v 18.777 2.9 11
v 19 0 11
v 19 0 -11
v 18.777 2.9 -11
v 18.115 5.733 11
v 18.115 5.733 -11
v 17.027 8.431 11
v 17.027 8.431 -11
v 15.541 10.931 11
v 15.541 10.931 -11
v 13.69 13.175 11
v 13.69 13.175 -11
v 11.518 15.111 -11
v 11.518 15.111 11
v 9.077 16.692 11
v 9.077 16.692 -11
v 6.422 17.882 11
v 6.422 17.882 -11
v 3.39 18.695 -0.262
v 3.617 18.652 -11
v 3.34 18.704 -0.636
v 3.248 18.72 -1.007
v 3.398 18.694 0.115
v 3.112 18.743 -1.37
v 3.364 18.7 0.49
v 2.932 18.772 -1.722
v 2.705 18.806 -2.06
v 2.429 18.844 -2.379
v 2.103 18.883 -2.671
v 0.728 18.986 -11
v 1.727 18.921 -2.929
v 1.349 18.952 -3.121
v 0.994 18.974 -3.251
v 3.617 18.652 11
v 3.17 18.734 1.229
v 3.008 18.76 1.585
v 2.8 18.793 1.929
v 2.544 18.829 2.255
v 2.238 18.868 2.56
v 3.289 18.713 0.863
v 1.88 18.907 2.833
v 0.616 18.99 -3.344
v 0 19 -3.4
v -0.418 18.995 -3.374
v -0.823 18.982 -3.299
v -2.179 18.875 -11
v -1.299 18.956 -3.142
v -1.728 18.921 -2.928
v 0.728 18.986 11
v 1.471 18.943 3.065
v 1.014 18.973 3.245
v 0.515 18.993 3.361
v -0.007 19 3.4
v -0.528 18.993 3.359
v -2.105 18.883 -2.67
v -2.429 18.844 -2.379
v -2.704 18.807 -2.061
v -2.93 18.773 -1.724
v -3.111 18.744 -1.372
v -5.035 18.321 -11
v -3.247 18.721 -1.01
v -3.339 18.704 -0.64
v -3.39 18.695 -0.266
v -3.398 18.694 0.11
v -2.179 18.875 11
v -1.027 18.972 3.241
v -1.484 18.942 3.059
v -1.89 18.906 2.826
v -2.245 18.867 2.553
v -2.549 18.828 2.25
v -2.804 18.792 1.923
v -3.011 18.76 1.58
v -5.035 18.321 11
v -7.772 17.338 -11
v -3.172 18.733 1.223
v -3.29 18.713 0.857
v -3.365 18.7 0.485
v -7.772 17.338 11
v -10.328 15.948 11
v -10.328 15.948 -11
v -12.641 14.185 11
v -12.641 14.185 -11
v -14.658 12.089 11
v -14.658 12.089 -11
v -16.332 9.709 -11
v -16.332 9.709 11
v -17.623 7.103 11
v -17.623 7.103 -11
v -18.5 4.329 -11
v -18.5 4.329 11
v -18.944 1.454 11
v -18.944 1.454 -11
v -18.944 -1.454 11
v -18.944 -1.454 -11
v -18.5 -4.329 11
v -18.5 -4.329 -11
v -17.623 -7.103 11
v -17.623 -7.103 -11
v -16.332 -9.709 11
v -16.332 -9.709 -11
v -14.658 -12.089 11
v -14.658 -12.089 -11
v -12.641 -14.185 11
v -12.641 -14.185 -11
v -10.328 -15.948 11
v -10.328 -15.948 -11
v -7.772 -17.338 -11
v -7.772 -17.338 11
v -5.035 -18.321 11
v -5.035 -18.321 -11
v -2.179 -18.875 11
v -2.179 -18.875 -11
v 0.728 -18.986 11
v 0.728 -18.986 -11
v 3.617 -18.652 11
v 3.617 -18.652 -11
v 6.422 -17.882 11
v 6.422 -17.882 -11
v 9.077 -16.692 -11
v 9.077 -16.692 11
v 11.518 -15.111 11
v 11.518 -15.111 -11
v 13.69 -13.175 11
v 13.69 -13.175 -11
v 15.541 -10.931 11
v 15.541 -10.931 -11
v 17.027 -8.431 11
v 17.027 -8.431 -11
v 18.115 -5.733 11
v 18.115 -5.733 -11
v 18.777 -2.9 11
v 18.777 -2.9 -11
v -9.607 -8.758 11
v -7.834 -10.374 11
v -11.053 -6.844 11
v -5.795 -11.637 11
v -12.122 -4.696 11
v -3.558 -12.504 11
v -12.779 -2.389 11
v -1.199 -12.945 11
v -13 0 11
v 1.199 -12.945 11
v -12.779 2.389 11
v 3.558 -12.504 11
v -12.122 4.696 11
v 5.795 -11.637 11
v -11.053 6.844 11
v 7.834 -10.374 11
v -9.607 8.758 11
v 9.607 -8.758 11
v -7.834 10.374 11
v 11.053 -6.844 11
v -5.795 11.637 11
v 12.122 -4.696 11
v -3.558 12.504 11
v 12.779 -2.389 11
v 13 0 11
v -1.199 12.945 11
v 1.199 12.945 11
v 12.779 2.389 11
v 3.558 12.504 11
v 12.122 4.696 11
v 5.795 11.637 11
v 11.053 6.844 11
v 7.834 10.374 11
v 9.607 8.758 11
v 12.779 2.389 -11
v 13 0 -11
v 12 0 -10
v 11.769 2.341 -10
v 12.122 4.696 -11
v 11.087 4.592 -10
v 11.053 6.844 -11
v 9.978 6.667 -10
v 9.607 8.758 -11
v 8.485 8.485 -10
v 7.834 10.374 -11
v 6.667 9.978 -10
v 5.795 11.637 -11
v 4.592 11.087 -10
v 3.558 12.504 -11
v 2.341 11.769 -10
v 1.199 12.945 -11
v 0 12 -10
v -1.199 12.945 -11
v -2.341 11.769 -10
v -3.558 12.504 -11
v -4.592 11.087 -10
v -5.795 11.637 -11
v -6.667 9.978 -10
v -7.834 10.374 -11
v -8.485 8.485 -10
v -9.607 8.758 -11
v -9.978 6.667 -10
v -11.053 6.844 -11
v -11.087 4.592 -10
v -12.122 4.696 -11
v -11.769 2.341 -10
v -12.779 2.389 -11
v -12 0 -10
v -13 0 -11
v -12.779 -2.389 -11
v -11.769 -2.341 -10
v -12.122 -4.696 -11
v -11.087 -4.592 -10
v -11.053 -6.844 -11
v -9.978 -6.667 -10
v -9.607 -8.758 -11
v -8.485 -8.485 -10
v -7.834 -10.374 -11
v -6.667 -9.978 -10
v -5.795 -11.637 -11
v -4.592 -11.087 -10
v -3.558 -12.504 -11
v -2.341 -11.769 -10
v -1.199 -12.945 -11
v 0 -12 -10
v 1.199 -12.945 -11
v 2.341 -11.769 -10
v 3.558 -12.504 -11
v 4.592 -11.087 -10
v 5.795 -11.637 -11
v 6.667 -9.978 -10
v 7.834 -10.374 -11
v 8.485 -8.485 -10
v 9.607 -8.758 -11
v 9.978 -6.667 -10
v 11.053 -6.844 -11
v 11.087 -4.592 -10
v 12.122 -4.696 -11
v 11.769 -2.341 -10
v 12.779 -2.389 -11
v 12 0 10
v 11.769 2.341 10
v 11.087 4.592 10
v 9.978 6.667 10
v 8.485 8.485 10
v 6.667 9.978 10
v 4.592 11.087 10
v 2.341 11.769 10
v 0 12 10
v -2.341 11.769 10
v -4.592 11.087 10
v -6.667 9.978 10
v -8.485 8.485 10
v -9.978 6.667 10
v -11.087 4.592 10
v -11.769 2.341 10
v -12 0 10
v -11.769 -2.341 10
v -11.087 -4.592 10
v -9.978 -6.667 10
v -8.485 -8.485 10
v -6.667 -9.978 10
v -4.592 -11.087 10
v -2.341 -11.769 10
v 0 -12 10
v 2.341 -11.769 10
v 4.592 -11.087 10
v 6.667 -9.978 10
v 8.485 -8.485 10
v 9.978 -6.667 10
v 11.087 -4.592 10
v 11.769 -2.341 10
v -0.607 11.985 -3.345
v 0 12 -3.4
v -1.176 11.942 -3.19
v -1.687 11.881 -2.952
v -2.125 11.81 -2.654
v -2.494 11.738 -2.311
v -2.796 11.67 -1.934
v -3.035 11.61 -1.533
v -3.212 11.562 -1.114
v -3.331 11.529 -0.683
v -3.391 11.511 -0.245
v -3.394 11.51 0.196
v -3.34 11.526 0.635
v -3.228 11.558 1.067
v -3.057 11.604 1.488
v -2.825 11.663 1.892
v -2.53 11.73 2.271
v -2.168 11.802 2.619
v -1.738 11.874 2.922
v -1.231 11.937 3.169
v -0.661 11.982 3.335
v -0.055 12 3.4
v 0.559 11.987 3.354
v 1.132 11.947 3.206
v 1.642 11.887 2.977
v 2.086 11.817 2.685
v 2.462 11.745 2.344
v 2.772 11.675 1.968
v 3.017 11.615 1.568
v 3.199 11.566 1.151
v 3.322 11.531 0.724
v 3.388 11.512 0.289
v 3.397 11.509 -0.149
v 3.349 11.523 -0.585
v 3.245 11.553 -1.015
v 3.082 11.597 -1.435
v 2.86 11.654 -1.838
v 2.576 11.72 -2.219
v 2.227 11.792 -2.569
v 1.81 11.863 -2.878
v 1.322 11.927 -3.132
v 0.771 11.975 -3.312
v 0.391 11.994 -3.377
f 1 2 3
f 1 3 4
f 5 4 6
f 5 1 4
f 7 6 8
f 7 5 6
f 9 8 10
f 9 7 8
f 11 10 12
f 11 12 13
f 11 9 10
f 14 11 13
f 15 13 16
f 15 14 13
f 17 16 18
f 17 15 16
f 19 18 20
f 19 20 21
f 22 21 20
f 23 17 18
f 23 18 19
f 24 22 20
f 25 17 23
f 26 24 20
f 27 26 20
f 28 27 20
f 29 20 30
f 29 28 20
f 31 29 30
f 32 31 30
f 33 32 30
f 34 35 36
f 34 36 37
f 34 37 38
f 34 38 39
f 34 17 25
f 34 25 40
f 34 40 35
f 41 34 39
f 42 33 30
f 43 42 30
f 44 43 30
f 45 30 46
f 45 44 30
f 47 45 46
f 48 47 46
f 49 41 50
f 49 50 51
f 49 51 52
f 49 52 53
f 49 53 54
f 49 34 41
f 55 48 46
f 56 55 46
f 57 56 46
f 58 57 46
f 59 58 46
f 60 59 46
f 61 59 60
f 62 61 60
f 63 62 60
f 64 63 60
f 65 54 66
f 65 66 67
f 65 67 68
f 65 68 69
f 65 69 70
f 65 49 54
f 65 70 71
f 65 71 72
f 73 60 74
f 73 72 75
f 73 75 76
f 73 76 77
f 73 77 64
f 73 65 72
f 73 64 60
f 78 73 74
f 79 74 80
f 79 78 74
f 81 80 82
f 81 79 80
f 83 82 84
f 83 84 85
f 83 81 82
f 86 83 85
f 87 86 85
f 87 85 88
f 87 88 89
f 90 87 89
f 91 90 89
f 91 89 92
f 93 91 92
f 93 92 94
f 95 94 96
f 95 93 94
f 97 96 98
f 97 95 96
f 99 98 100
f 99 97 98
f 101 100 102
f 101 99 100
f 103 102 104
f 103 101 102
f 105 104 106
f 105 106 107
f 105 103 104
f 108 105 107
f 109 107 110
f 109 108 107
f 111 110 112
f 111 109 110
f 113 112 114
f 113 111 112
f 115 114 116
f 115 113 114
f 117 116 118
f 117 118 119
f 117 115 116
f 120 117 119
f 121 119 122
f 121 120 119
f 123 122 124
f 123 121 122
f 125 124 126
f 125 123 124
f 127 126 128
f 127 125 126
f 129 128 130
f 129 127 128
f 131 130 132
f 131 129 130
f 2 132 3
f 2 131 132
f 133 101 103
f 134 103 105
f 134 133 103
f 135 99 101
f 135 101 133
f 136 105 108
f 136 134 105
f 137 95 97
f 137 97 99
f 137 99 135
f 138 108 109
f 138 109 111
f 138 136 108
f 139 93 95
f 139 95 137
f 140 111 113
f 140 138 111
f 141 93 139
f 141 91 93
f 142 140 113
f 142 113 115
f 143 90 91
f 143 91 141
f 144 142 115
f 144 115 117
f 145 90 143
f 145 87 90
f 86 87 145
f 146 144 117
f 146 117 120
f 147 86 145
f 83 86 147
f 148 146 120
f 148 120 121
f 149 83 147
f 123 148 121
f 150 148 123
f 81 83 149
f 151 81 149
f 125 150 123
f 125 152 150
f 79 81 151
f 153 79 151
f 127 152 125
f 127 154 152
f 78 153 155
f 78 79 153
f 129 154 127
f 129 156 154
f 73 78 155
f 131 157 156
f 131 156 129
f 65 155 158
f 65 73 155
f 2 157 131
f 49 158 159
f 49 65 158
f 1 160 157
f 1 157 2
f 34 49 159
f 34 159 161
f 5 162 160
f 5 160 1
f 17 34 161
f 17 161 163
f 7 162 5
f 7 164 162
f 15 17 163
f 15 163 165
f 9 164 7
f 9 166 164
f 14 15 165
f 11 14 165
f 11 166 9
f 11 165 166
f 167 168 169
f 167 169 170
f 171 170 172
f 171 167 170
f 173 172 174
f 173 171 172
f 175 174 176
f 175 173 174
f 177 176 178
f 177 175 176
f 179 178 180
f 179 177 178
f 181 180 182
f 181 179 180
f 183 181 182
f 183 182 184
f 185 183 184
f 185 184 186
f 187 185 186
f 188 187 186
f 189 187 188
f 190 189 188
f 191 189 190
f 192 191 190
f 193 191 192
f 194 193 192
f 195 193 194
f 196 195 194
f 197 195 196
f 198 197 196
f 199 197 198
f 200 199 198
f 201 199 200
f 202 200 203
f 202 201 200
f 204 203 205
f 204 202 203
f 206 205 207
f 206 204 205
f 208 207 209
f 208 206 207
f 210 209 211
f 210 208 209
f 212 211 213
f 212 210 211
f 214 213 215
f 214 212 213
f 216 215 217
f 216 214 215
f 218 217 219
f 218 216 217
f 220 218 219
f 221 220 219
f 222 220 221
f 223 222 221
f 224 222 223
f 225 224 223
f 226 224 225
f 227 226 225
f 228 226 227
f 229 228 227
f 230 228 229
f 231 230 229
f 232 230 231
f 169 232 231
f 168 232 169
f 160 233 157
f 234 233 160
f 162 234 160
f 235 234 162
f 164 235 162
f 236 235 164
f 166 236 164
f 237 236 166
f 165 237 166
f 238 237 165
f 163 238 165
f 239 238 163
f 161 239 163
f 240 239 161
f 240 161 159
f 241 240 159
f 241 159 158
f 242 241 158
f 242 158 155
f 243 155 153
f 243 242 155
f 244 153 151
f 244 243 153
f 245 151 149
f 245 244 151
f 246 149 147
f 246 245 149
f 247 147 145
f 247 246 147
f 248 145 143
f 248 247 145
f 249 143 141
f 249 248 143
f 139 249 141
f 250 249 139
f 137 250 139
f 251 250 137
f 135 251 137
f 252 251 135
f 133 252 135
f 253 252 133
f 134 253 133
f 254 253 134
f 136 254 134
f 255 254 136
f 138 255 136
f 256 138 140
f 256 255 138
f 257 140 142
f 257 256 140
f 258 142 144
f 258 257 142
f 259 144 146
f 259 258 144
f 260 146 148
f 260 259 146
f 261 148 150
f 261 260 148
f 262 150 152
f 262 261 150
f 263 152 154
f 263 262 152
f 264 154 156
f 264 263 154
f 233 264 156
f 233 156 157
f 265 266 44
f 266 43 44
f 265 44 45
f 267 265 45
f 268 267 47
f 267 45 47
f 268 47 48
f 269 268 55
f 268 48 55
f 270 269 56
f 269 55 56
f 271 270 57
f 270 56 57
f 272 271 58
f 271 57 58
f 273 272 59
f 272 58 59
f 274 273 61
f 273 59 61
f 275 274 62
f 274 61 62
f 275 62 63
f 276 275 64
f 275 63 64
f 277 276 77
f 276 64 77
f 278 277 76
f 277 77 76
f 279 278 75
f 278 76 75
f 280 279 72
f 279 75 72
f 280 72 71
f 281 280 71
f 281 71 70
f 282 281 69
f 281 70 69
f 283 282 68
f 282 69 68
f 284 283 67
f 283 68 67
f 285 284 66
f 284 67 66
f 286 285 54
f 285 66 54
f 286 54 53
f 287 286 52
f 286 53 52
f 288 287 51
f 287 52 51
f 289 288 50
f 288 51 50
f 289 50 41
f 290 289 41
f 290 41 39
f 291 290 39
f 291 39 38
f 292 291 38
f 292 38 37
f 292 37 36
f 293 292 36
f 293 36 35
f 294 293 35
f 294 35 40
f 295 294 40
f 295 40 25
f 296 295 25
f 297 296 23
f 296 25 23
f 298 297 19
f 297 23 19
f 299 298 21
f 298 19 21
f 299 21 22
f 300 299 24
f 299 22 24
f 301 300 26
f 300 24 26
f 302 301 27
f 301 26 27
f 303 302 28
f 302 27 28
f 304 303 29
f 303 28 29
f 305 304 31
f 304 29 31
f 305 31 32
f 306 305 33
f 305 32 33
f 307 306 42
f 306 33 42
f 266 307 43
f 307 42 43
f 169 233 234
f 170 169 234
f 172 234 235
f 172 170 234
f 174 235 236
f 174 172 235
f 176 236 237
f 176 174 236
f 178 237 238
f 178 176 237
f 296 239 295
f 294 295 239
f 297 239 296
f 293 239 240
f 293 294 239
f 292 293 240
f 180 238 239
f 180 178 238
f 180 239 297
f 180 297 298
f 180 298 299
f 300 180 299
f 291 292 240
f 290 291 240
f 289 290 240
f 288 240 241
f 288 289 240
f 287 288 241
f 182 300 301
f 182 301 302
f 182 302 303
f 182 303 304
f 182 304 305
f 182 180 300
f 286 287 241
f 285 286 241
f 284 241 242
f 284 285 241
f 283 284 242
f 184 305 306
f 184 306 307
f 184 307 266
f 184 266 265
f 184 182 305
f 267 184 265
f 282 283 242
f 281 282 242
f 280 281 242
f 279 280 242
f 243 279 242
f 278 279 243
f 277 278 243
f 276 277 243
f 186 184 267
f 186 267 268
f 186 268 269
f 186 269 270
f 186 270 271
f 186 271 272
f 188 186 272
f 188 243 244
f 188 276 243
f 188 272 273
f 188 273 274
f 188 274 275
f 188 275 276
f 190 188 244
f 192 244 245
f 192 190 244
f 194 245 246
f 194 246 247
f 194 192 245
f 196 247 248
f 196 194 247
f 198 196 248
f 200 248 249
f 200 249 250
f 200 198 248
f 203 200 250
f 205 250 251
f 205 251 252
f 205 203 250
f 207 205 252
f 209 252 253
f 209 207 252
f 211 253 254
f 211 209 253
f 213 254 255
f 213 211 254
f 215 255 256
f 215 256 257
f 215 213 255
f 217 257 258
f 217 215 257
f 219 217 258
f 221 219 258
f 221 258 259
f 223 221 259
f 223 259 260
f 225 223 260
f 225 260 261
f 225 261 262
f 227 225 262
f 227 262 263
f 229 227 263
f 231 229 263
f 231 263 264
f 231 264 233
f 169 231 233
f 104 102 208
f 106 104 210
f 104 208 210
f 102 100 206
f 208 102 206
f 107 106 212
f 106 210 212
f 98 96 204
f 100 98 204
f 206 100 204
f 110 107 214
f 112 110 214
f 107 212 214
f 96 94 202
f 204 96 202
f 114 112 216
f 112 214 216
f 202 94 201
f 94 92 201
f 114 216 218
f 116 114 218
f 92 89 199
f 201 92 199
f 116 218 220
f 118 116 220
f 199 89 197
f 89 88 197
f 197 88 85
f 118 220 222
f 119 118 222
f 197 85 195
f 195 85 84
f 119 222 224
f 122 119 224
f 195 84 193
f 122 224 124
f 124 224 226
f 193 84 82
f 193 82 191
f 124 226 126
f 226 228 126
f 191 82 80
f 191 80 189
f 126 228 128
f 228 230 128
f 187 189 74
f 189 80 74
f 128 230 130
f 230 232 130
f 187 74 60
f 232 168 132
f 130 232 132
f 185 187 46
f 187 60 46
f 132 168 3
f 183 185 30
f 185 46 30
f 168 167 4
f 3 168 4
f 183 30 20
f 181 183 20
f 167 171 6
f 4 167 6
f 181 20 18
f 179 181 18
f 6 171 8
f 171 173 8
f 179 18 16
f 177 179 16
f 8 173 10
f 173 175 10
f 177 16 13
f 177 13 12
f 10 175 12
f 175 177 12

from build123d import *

# Parameters (mm, degrees)
SKETCH_1_R      = 19
SKETCH_1_R_2    = 12
EXTRUDE_1_DEPTH = 11
CHAMFER_1_SIZE  = 1
SKETCH_3_W      = 3.4
SKETCH_3_H      = 19


with BuildPart() as part:
    # 草图1 → 凸台-拉伸1 (new, symmetric)
    with BuildSketch(Plane.XY):
        Circle(SKETCH_1_R)
        Circle(SKETCH_1_R_2, mode=Mode.SUBTRACT)
    extrude(amount=EXTRUDE_1_DEPTH, both=True)

    # 倒角1
    chamfer_1_edges = [part.edges().sort_by_distance(p)[0] for p in [
        (-12, 0, -11),
        (-12, 0, 11),
    ]]
    chamfer(chamfer_1_edges, length=CHAMFER_1_SIZE)

    # 草图3 → M8 螺纹孔1 (revolve, cut)
    with BuildSketch(Plane(origin=(0, 0, 0), x_dir=(0, 0, -1), z_dir=(1, 0, 0))):
        with Locations((1.7, 9.5)):
            Rectangle(SKETCH_3_W, SKETCH_3_H)
    revolve(axis=Axis((0, -6.35, 0), (0, 1, 0)), mode=Mode.SUBTRACT)


solid = part.part
